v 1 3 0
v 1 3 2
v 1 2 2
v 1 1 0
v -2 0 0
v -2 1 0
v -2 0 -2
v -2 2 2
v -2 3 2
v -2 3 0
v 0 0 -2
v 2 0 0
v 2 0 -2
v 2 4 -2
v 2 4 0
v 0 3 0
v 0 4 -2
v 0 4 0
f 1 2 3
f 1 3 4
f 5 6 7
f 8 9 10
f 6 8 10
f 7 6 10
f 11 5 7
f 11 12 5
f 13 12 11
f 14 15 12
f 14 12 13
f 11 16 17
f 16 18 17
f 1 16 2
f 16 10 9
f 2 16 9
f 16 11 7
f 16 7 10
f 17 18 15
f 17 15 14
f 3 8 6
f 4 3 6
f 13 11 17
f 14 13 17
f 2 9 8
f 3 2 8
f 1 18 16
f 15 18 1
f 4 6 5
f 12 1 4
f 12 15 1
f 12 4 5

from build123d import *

# Parameters (mm, degrees)
SKETCH1_W                = 2
SKETCH1_H                = 4
BOSS_EXTRUDE1_DEPTH      = 2
BOSS_EXTRUDE2_DEPTH      = 2
BOSS_EXTRUDE2_DEPTH_BACK = 1


with BuildPart() as part:
    # Sketch1 → Boss-Extrude1 (new body)
    with BuildSketch(Plane(origin=(0, 0, 0), x_dir=(0, 0, -1), z_dir=(1, 0, 0))):
        with Locations((1, 2)):
            Rectangle(SKETCH1_W, SKETCH1_H)
    extrude(amount=BOSS_EXTRUDE1_DEPTH)

    # Sketch2 → Boss-Extrude2 (add, two sides)
    with BuildSketch(Plane.ZY) as boss_extrude2_sk:
        Polygon((-2, 0), (0, 3), (2, 3), (2, 2), (0, 1), (0, 0), align=None)
    extrude(amount=BOSS_EXTRUDE2_DEPTH)
    extrude(boss_extrude2_sk.sketch, amount=-BOSS_EXTRUDE2_DEPTH_BACK)


solid = part.part
